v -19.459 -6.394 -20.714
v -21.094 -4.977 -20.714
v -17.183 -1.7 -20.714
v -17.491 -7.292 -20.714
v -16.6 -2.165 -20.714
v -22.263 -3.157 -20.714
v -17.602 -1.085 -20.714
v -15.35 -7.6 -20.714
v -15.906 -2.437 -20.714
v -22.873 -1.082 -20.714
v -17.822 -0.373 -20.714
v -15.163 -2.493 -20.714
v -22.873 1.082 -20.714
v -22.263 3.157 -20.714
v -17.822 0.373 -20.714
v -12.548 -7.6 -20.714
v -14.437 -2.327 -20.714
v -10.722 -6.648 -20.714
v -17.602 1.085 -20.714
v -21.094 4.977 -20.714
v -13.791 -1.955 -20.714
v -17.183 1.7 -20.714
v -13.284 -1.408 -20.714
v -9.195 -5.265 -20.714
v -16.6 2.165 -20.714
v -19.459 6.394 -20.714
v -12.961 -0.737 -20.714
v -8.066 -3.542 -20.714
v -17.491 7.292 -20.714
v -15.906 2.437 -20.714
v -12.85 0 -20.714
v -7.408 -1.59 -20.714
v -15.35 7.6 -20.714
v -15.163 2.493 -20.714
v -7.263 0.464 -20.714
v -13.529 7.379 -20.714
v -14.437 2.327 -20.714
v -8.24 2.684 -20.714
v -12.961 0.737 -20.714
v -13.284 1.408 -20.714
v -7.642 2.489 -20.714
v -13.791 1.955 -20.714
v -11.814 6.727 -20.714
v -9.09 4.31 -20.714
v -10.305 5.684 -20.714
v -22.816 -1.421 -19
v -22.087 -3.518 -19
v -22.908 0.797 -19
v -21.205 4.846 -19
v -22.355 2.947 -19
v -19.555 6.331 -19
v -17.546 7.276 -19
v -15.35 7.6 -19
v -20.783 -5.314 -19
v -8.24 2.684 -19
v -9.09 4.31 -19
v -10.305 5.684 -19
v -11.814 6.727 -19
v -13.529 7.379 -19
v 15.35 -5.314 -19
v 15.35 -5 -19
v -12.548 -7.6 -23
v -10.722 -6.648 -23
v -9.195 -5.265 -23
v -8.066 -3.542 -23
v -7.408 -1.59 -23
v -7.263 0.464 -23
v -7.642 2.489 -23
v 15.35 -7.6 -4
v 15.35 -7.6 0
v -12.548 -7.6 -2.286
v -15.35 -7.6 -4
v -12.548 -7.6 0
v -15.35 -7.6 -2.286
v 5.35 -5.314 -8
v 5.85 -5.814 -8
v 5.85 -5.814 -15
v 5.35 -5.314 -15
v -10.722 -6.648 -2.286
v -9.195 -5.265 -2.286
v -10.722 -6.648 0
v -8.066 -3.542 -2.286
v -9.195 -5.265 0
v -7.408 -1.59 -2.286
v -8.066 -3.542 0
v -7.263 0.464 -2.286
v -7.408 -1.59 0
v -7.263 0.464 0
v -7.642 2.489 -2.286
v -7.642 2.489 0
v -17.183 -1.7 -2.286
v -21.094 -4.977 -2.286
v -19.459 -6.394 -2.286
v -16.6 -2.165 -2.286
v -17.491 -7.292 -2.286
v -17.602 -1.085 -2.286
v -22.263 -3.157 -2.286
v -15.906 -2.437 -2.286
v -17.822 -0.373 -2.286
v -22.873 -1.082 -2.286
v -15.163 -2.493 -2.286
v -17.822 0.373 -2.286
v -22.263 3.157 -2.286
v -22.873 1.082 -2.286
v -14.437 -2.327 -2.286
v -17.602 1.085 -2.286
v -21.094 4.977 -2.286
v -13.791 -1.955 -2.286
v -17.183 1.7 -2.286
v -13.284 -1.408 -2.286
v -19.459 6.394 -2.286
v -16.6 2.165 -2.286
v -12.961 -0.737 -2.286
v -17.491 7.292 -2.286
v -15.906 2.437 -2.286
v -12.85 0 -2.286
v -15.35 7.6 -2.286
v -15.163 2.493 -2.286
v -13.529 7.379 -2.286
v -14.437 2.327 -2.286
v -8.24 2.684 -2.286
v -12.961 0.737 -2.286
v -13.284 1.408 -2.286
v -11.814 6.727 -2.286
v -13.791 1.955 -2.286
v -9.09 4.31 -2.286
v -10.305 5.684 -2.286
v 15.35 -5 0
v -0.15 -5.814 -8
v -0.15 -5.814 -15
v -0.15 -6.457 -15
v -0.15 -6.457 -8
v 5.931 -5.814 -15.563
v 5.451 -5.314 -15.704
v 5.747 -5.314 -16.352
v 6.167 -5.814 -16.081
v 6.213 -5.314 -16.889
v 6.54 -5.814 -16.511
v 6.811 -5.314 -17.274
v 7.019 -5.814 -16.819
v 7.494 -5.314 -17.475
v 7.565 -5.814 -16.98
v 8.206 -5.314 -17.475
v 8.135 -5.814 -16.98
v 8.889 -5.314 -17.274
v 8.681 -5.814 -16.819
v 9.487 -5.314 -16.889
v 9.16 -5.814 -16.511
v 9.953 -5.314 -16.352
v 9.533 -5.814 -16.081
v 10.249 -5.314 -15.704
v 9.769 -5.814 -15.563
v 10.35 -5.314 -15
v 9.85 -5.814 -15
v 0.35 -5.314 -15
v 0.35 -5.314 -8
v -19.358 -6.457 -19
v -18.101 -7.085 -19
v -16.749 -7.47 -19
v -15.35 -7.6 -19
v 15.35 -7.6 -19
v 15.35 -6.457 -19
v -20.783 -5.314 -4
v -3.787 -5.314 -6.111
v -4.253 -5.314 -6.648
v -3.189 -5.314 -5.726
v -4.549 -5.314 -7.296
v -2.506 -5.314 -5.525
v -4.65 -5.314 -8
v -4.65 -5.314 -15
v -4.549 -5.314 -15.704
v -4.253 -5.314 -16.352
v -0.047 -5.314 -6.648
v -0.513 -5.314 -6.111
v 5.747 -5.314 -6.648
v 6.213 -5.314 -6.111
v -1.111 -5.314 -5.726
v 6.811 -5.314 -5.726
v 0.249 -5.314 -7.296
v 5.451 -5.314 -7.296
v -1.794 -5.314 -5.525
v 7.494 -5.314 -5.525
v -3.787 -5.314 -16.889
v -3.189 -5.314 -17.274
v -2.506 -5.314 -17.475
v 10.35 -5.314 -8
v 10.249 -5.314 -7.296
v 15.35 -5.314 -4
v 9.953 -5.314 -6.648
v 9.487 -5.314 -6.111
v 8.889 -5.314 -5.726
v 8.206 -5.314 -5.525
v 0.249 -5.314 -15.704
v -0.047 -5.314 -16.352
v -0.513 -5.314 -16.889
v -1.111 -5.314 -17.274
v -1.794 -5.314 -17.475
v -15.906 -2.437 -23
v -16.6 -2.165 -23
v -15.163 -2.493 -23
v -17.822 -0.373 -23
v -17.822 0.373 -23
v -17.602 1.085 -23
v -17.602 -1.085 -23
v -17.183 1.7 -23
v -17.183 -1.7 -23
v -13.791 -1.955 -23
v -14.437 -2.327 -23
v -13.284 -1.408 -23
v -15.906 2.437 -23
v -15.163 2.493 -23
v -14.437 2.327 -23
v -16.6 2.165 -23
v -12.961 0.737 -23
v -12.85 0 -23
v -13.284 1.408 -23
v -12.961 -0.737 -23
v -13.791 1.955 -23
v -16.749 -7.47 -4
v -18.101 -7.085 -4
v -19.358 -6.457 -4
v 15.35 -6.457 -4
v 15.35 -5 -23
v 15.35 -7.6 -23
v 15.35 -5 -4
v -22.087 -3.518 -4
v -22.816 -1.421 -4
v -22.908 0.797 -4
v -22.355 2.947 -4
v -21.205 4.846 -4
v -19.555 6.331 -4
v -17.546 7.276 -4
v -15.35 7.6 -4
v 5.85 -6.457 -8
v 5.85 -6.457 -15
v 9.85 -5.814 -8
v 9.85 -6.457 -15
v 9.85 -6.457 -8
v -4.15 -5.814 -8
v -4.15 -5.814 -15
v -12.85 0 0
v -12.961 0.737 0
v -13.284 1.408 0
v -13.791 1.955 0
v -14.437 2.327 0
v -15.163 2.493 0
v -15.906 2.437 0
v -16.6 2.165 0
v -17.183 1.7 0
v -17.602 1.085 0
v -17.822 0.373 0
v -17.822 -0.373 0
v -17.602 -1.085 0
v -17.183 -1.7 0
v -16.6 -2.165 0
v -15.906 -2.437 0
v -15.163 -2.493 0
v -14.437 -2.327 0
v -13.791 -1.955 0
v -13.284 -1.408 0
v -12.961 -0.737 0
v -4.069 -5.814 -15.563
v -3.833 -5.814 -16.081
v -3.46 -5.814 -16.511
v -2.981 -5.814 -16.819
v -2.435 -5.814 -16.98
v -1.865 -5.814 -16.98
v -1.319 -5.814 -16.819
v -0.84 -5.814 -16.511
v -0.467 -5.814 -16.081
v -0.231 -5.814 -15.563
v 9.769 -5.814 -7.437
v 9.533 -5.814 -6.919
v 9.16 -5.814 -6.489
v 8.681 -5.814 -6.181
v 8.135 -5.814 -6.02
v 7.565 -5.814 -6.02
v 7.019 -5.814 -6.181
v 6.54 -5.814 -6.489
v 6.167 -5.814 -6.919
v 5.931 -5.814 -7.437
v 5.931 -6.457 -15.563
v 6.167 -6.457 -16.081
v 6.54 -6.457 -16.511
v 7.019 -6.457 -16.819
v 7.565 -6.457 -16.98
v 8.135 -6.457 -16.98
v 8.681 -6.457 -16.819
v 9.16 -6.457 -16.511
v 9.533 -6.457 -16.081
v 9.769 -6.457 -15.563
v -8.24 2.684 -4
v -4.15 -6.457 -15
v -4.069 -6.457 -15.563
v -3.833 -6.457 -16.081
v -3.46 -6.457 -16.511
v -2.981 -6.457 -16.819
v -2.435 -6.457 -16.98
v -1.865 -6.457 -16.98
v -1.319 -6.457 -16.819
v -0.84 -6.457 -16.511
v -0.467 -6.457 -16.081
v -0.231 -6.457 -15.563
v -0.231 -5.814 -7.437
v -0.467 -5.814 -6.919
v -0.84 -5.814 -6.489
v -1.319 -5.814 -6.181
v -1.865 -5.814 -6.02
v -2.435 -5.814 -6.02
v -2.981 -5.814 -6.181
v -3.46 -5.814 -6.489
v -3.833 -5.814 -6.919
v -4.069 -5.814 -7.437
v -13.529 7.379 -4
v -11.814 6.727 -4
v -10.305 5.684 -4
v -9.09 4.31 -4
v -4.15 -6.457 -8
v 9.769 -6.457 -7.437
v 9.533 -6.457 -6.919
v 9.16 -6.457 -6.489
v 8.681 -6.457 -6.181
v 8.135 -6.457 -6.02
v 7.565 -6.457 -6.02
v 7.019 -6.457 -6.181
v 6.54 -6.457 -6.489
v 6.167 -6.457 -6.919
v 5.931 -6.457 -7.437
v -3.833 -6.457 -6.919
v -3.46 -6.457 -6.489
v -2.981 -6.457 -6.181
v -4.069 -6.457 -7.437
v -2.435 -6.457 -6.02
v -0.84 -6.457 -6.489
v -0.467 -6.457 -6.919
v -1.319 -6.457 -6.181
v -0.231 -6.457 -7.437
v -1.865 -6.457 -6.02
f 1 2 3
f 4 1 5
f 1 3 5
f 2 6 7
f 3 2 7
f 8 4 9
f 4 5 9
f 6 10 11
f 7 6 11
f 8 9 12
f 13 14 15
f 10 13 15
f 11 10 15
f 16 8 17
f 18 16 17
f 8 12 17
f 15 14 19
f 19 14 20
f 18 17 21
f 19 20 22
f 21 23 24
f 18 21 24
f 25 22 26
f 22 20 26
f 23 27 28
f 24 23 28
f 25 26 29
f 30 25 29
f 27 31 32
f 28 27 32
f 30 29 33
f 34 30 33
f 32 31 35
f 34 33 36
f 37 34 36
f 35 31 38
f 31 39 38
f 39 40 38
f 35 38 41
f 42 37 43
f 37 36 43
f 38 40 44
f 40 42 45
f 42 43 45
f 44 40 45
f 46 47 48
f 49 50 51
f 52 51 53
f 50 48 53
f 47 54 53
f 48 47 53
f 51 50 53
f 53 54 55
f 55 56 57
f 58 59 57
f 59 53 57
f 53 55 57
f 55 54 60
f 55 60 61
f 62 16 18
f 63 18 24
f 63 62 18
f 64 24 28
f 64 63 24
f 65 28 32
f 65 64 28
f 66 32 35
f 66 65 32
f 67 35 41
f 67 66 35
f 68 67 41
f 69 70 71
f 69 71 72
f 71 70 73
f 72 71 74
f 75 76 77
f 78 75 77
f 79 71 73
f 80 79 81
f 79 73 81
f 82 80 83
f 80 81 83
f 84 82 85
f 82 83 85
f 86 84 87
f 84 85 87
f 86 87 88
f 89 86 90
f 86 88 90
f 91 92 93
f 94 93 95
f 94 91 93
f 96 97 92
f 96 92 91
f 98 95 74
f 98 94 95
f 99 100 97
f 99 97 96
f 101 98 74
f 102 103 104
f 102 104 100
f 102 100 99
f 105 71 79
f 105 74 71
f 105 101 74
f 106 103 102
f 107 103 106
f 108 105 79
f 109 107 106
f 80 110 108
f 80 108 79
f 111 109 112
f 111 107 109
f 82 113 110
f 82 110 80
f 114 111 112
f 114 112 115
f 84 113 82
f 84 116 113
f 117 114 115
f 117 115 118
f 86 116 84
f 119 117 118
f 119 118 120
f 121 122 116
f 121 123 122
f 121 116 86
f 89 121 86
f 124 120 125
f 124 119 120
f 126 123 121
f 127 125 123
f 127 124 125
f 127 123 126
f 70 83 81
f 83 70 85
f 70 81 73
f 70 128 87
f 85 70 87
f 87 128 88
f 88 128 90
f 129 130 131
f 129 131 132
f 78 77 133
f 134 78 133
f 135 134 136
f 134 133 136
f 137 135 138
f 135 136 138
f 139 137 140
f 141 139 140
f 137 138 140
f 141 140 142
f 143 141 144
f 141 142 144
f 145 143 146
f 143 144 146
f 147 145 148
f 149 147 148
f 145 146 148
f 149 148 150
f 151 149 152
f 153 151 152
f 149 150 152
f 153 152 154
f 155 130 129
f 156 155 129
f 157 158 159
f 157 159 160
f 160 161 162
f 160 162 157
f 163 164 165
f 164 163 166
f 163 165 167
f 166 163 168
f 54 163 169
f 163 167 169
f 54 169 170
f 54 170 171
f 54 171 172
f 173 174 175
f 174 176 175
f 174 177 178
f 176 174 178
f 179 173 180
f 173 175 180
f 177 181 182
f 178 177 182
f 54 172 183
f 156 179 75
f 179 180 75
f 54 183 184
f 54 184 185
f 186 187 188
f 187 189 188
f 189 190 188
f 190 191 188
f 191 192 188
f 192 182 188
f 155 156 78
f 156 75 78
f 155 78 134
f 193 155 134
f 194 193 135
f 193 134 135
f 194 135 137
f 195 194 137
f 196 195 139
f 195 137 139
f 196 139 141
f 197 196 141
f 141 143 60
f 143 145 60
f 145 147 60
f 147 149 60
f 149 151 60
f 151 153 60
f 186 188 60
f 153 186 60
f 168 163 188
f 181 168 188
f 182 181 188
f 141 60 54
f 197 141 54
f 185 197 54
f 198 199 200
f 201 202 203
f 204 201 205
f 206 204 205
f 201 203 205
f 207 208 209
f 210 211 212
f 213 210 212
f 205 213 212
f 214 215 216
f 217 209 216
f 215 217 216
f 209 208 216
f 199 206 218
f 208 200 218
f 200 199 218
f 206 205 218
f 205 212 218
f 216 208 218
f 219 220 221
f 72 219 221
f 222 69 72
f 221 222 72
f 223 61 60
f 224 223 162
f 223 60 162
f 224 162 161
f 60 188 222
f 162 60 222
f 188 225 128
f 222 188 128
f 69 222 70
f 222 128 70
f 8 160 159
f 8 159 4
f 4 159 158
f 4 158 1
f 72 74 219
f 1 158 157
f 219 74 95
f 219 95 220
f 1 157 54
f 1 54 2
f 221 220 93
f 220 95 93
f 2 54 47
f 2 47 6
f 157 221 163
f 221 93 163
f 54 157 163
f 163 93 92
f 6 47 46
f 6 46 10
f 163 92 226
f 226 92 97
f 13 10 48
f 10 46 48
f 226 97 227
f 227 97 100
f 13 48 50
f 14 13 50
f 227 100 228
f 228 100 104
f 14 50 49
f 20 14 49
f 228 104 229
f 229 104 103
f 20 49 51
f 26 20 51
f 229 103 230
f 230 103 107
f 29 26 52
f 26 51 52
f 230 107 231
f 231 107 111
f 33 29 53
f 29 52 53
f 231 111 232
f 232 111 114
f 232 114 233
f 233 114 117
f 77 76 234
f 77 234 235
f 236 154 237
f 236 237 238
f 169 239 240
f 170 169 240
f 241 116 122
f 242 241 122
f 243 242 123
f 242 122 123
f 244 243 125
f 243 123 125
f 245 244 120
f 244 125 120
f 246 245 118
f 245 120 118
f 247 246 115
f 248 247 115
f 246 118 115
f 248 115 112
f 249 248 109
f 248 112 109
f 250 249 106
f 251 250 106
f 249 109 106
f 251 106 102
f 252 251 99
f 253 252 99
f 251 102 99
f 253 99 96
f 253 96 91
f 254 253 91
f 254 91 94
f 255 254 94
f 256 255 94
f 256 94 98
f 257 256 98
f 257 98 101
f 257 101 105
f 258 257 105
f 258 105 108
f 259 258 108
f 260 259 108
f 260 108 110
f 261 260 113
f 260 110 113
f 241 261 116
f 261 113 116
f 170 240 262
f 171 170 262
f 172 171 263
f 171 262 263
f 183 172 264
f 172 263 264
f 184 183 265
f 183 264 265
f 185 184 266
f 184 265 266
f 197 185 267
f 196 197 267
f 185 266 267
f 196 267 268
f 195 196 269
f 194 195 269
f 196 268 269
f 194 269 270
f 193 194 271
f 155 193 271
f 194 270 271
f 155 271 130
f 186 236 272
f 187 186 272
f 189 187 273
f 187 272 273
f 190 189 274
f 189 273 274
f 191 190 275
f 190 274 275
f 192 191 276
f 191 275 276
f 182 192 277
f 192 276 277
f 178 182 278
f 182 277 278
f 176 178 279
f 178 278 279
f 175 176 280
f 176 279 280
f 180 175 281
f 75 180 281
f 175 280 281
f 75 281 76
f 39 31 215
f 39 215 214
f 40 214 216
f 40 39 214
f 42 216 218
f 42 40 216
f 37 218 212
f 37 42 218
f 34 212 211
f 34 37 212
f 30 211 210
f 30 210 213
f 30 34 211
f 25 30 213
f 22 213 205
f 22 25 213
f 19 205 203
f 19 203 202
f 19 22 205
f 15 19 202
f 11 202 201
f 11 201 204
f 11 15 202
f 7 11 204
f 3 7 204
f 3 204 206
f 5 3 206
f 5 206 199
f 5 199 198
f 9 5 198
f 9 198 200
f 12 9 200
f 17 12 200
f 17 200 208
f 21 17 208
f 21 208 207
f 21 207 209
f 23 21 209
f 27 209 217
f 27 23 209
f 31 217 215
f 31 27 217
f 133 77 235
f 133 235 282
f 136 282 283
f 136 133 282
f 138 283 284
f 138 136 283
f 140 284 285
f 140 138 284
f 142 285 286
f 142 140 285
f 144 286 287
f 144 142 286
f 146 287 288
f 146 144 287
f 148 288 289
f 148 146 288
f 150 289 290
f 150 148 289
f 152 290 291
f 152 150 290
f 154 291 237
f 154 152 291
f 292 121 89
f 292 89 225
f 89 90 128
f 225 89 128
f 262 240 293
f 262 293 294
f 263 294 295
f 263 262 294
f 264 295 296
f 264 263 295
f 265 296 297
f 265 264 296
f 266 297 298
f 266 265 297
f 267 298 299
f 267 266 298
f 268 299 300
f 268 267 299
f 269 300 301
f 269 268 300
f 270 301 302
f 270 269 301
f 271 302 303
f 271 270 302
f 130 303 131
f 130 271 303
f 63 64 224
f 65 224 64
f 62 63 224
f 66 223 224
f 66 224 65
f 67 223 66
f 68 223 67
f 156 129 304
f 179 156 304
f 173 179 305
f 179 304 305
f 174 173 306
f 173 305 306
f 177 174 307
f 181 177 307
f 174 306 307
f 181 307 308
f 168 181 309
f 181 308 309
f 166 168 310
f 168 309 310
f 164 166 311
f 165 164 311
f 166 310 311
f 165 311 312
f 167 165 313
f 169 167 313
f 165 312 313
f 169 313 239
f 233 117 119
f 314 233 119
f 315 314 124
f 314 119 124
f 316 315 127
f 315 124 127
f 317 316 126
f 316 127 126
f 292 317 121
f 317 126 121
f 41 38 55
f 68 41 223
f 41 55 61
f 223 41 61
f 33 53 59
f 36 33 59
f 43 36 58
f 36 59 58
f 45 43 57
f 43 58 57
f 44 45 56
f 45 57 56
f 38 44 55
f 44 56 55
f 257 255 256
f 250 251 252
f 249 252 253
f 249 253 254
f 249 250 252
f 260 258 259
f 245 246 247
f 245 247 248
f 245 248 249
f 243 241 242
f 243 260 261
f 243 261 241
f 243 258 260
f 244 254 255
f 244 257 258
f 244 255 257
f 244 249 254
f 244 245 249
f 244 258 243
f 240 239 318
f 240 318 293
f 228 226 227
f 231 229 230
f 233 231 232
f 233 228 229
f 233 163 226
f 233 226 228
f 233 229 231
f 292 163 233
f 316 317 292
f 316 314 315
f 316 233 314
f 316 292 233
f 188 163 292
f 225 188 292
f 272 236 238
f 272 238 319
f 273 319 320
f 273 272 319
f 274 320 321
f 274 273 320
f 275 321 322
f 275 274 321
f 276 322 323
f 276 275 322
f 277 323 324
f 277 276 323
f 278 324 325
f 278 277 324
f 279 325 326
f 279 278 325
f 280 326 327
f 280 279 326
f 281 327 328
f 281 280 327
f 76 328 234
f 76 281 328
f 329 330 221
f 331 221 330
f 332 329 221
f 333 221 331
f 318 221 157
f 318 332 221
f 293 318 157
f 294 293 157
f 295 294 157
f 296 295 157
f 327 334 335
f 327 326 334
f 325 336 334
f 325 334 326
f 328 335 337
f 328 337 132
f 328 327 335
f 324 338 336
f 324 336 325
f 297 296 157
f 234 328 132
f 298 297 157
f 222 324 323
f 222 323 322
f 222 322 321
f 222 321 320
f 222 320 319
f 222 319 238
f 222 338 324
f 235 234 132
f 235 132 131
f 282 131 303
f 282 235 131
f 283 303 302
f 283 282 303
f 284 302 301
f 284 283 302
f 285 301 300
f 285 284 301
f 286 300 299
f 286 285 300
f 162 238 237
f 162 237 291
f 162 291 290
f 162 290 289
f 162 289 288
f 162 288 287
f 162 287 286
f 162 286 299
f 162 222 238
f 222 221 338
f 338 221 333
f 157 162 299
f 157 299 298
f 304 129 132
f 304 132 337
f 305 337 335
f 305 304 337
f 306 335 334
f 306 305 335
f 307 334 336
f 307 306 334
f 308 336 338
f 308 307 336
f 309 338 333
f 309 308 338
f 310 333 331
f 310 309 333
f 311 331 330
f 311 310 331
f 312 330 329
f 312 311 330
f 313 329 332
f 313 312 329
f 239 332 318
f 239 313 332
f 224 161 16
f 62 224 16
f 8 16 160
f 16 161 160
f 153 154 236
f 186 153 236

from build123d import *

# Parameters (mm, degrees)
BOSS_EXTRUDE1_DEPTH = 23
CUT_EXTRUDE1_DEPTH  = 24
SKETCH3_W           = 15
SKETCH3_H           = 12.914285714
CUT_EXTRUDE2_DEPTH  = 39.3
CUT_EXTRUDE4_DEPTH  = 3.285714286
SKETCH4_W           = 15
SKETCH4_H           = 1.142857143
CUT_EXTRUDE3_DEPTH  = 39.3
SKETCH_1_R          = 8.1
CUT_EXTRUDE_1_DEPTH = 2.285714
BOSS_EXTRUDE3_START = -2.285714
SKETCH7_R           = 2.5
BOSS_EXTRUDE3_DEPTH = 2.285714
EXTRUDE_START       = -20.714286
SKETCH7_2_R         = 2.5
EXTRUDE_1_DEPTH     = 2.285714
CHAMFER1_SIZE       = 0.5


with BuildPart() as part:
    # Sketch1 → Boss-Extrude1 (new body)
    with BuildSketch(Plane.XY):
        with BuildLine():
            Line((-15.35, 7.6), (15.35, 7.6))
            ThreePointArc((15.35, 7.6), (22.95, 0), (15.35, -7.6))
            Line((15.35, -7.6), (-15.35, -7.6))
            ThreePointArc((-15.35, -7.6), (-22.95, 0), (-15.35, 7.6))
        make_face()
    extrude(amount=-BOSS_EXTRUDE1_DEPTH)

    # Sketch2 → Cut-Extrude1 (cut, through all)
    with BuildSketch(Plane.XY):
        with BuildLine():
            Line((-8.239692572, 2.683938949), (15.35, -5))
            Line((15.35, -5), (15.35, -7.6))
            ThreePointArc((15.35, -7.6), (22.95, 0), (15.35, 7.6))
            Line((15.35, 7.6), (-15.35, 7.6))
            ThreePointArc((-15.35, 7.6), (-11.027844057, 6.251317302), (-8.239692572, 2.683938949))
        make_face()
    extrude(amount=-CUT_EXTRUDE1_DEPTH, mode=Mode.SUBTRACT)

    # Sketch3 → Cut-Extrude2 (cut, through all)
    with BuildSketch(Plane(origin=(15.35, 0, 0), x_dir=(0, 0, -1), z_dir=(1, 0, 0))):
        with Locations((11.5, 1.142857143)):
            Rectangle(SKETCH3_W, SKETCH3_H)
    extrude(amount=-CUT_EXTRUDE2_DEPTH, mode=Mode.SUBTRACT)

    # Sketch5 → Cut-Extrude4 (cut, through all)
    with BuildSketch(Plane(origin=(0, -5.314285714, 0), x_dir=(1, 0, 0), z_dir=(0, 1, 0))):
        with BuildLine():
            Line((9.85, 15), (9.85, 8))
            ThreePointArc((9.85, 8), (7.85, 6), (5.85, 8))
            Line((5.85, 8), (5.85, 15))
            ThreePointArc((5.85, 15), (7.85, 17), (9.85, 15))
        make_face()
        with BuildLine():
            Line((-0.15, 15), (-0.15, 8))
            ThreePointArc((-0.15, 8), (-2.15, 6), (-4.15, 8))
            Line((-4.15, 8), (-4.15, 15))
            ThreePointArc((-4.15, 15), (-2.15, 17), (-0.15, 15))
        make_face()
    extrude(amount=-CUT_EXTRUDE4_DEPTH, mode=Mode.SUBTRACT)

    # Sketch4 → Cut-Extrude3 (cut, through all)
    with BuildSketch(Plane(origin=(15.35, 0, 0), x_dir=(0, 0, -1), z_dir=(1, 0, 0))):
        with Locations((11.5, -7.028571429)):
            Rectangle(SKETCH4_W, SKETCH4_H)
    extrude(amount=-CUT_EXTRUDE3_DEPTH, mode=Mode.SUBTRACT)

    # Sketch 1 → Cut-Extrude 1 (cut)
    with BuildSketch(Plane.XY):
        with Locations((-15.35, 0)):
            Circle(SKETCH_1_R)
    cut_extrude_1 = extrude(amount=-CUT_EXTRUDE_1_DEPTH, mode=Mode.SUBTRACT)

    # Sketch7 → Boss-Extrude3 (add)
    with BuildSketch(Plane.XY.offset(BOSS_EXTRUDE3_START)):
        with Locations((-15.35, 0)):
            Circle(SKETCH7_R)
    extrude(amount=BOSS_EXTRUDE3_DEPTH)

    # Mirror 1: Cut-Extrude 1 across plane
    add(cut_extrude_1.mirror(Plane.XY.offset(-11.5)), mode=Mode.SUBTRACT)

    # Sketch7_2 → Extrude 1 (add)
    with BuildSketch(Plane.XY.offset(EXTRUDE_START)):
        with Locations((-15.35, 0)):
            Circle(SKETCH7_2_R)
    extrude(amount=-EXTRUDE_1_DEPTH)

    # Chamfer1
    chamfer1_edges = [part.edges().sort_by_distance(p)[0] for p in [
        (7.85, -5.314285714, -17),
        (5.85, -5.314285714, -11.5),
        (7.85, -5.314285714, -6),
        (9.85, -5.314285714, -11.5),
        (-2.15, -5.314285714, -17),
        (-4.15, -5.314285714, -11.5),
        (-2.15, -5.314285714, -6),
        (-0.15, -5.314285714, -11.5),
    ]]
    chamfer(chamfer1_edges, length=CHAMFER1_SIZE)


solid = part.part
